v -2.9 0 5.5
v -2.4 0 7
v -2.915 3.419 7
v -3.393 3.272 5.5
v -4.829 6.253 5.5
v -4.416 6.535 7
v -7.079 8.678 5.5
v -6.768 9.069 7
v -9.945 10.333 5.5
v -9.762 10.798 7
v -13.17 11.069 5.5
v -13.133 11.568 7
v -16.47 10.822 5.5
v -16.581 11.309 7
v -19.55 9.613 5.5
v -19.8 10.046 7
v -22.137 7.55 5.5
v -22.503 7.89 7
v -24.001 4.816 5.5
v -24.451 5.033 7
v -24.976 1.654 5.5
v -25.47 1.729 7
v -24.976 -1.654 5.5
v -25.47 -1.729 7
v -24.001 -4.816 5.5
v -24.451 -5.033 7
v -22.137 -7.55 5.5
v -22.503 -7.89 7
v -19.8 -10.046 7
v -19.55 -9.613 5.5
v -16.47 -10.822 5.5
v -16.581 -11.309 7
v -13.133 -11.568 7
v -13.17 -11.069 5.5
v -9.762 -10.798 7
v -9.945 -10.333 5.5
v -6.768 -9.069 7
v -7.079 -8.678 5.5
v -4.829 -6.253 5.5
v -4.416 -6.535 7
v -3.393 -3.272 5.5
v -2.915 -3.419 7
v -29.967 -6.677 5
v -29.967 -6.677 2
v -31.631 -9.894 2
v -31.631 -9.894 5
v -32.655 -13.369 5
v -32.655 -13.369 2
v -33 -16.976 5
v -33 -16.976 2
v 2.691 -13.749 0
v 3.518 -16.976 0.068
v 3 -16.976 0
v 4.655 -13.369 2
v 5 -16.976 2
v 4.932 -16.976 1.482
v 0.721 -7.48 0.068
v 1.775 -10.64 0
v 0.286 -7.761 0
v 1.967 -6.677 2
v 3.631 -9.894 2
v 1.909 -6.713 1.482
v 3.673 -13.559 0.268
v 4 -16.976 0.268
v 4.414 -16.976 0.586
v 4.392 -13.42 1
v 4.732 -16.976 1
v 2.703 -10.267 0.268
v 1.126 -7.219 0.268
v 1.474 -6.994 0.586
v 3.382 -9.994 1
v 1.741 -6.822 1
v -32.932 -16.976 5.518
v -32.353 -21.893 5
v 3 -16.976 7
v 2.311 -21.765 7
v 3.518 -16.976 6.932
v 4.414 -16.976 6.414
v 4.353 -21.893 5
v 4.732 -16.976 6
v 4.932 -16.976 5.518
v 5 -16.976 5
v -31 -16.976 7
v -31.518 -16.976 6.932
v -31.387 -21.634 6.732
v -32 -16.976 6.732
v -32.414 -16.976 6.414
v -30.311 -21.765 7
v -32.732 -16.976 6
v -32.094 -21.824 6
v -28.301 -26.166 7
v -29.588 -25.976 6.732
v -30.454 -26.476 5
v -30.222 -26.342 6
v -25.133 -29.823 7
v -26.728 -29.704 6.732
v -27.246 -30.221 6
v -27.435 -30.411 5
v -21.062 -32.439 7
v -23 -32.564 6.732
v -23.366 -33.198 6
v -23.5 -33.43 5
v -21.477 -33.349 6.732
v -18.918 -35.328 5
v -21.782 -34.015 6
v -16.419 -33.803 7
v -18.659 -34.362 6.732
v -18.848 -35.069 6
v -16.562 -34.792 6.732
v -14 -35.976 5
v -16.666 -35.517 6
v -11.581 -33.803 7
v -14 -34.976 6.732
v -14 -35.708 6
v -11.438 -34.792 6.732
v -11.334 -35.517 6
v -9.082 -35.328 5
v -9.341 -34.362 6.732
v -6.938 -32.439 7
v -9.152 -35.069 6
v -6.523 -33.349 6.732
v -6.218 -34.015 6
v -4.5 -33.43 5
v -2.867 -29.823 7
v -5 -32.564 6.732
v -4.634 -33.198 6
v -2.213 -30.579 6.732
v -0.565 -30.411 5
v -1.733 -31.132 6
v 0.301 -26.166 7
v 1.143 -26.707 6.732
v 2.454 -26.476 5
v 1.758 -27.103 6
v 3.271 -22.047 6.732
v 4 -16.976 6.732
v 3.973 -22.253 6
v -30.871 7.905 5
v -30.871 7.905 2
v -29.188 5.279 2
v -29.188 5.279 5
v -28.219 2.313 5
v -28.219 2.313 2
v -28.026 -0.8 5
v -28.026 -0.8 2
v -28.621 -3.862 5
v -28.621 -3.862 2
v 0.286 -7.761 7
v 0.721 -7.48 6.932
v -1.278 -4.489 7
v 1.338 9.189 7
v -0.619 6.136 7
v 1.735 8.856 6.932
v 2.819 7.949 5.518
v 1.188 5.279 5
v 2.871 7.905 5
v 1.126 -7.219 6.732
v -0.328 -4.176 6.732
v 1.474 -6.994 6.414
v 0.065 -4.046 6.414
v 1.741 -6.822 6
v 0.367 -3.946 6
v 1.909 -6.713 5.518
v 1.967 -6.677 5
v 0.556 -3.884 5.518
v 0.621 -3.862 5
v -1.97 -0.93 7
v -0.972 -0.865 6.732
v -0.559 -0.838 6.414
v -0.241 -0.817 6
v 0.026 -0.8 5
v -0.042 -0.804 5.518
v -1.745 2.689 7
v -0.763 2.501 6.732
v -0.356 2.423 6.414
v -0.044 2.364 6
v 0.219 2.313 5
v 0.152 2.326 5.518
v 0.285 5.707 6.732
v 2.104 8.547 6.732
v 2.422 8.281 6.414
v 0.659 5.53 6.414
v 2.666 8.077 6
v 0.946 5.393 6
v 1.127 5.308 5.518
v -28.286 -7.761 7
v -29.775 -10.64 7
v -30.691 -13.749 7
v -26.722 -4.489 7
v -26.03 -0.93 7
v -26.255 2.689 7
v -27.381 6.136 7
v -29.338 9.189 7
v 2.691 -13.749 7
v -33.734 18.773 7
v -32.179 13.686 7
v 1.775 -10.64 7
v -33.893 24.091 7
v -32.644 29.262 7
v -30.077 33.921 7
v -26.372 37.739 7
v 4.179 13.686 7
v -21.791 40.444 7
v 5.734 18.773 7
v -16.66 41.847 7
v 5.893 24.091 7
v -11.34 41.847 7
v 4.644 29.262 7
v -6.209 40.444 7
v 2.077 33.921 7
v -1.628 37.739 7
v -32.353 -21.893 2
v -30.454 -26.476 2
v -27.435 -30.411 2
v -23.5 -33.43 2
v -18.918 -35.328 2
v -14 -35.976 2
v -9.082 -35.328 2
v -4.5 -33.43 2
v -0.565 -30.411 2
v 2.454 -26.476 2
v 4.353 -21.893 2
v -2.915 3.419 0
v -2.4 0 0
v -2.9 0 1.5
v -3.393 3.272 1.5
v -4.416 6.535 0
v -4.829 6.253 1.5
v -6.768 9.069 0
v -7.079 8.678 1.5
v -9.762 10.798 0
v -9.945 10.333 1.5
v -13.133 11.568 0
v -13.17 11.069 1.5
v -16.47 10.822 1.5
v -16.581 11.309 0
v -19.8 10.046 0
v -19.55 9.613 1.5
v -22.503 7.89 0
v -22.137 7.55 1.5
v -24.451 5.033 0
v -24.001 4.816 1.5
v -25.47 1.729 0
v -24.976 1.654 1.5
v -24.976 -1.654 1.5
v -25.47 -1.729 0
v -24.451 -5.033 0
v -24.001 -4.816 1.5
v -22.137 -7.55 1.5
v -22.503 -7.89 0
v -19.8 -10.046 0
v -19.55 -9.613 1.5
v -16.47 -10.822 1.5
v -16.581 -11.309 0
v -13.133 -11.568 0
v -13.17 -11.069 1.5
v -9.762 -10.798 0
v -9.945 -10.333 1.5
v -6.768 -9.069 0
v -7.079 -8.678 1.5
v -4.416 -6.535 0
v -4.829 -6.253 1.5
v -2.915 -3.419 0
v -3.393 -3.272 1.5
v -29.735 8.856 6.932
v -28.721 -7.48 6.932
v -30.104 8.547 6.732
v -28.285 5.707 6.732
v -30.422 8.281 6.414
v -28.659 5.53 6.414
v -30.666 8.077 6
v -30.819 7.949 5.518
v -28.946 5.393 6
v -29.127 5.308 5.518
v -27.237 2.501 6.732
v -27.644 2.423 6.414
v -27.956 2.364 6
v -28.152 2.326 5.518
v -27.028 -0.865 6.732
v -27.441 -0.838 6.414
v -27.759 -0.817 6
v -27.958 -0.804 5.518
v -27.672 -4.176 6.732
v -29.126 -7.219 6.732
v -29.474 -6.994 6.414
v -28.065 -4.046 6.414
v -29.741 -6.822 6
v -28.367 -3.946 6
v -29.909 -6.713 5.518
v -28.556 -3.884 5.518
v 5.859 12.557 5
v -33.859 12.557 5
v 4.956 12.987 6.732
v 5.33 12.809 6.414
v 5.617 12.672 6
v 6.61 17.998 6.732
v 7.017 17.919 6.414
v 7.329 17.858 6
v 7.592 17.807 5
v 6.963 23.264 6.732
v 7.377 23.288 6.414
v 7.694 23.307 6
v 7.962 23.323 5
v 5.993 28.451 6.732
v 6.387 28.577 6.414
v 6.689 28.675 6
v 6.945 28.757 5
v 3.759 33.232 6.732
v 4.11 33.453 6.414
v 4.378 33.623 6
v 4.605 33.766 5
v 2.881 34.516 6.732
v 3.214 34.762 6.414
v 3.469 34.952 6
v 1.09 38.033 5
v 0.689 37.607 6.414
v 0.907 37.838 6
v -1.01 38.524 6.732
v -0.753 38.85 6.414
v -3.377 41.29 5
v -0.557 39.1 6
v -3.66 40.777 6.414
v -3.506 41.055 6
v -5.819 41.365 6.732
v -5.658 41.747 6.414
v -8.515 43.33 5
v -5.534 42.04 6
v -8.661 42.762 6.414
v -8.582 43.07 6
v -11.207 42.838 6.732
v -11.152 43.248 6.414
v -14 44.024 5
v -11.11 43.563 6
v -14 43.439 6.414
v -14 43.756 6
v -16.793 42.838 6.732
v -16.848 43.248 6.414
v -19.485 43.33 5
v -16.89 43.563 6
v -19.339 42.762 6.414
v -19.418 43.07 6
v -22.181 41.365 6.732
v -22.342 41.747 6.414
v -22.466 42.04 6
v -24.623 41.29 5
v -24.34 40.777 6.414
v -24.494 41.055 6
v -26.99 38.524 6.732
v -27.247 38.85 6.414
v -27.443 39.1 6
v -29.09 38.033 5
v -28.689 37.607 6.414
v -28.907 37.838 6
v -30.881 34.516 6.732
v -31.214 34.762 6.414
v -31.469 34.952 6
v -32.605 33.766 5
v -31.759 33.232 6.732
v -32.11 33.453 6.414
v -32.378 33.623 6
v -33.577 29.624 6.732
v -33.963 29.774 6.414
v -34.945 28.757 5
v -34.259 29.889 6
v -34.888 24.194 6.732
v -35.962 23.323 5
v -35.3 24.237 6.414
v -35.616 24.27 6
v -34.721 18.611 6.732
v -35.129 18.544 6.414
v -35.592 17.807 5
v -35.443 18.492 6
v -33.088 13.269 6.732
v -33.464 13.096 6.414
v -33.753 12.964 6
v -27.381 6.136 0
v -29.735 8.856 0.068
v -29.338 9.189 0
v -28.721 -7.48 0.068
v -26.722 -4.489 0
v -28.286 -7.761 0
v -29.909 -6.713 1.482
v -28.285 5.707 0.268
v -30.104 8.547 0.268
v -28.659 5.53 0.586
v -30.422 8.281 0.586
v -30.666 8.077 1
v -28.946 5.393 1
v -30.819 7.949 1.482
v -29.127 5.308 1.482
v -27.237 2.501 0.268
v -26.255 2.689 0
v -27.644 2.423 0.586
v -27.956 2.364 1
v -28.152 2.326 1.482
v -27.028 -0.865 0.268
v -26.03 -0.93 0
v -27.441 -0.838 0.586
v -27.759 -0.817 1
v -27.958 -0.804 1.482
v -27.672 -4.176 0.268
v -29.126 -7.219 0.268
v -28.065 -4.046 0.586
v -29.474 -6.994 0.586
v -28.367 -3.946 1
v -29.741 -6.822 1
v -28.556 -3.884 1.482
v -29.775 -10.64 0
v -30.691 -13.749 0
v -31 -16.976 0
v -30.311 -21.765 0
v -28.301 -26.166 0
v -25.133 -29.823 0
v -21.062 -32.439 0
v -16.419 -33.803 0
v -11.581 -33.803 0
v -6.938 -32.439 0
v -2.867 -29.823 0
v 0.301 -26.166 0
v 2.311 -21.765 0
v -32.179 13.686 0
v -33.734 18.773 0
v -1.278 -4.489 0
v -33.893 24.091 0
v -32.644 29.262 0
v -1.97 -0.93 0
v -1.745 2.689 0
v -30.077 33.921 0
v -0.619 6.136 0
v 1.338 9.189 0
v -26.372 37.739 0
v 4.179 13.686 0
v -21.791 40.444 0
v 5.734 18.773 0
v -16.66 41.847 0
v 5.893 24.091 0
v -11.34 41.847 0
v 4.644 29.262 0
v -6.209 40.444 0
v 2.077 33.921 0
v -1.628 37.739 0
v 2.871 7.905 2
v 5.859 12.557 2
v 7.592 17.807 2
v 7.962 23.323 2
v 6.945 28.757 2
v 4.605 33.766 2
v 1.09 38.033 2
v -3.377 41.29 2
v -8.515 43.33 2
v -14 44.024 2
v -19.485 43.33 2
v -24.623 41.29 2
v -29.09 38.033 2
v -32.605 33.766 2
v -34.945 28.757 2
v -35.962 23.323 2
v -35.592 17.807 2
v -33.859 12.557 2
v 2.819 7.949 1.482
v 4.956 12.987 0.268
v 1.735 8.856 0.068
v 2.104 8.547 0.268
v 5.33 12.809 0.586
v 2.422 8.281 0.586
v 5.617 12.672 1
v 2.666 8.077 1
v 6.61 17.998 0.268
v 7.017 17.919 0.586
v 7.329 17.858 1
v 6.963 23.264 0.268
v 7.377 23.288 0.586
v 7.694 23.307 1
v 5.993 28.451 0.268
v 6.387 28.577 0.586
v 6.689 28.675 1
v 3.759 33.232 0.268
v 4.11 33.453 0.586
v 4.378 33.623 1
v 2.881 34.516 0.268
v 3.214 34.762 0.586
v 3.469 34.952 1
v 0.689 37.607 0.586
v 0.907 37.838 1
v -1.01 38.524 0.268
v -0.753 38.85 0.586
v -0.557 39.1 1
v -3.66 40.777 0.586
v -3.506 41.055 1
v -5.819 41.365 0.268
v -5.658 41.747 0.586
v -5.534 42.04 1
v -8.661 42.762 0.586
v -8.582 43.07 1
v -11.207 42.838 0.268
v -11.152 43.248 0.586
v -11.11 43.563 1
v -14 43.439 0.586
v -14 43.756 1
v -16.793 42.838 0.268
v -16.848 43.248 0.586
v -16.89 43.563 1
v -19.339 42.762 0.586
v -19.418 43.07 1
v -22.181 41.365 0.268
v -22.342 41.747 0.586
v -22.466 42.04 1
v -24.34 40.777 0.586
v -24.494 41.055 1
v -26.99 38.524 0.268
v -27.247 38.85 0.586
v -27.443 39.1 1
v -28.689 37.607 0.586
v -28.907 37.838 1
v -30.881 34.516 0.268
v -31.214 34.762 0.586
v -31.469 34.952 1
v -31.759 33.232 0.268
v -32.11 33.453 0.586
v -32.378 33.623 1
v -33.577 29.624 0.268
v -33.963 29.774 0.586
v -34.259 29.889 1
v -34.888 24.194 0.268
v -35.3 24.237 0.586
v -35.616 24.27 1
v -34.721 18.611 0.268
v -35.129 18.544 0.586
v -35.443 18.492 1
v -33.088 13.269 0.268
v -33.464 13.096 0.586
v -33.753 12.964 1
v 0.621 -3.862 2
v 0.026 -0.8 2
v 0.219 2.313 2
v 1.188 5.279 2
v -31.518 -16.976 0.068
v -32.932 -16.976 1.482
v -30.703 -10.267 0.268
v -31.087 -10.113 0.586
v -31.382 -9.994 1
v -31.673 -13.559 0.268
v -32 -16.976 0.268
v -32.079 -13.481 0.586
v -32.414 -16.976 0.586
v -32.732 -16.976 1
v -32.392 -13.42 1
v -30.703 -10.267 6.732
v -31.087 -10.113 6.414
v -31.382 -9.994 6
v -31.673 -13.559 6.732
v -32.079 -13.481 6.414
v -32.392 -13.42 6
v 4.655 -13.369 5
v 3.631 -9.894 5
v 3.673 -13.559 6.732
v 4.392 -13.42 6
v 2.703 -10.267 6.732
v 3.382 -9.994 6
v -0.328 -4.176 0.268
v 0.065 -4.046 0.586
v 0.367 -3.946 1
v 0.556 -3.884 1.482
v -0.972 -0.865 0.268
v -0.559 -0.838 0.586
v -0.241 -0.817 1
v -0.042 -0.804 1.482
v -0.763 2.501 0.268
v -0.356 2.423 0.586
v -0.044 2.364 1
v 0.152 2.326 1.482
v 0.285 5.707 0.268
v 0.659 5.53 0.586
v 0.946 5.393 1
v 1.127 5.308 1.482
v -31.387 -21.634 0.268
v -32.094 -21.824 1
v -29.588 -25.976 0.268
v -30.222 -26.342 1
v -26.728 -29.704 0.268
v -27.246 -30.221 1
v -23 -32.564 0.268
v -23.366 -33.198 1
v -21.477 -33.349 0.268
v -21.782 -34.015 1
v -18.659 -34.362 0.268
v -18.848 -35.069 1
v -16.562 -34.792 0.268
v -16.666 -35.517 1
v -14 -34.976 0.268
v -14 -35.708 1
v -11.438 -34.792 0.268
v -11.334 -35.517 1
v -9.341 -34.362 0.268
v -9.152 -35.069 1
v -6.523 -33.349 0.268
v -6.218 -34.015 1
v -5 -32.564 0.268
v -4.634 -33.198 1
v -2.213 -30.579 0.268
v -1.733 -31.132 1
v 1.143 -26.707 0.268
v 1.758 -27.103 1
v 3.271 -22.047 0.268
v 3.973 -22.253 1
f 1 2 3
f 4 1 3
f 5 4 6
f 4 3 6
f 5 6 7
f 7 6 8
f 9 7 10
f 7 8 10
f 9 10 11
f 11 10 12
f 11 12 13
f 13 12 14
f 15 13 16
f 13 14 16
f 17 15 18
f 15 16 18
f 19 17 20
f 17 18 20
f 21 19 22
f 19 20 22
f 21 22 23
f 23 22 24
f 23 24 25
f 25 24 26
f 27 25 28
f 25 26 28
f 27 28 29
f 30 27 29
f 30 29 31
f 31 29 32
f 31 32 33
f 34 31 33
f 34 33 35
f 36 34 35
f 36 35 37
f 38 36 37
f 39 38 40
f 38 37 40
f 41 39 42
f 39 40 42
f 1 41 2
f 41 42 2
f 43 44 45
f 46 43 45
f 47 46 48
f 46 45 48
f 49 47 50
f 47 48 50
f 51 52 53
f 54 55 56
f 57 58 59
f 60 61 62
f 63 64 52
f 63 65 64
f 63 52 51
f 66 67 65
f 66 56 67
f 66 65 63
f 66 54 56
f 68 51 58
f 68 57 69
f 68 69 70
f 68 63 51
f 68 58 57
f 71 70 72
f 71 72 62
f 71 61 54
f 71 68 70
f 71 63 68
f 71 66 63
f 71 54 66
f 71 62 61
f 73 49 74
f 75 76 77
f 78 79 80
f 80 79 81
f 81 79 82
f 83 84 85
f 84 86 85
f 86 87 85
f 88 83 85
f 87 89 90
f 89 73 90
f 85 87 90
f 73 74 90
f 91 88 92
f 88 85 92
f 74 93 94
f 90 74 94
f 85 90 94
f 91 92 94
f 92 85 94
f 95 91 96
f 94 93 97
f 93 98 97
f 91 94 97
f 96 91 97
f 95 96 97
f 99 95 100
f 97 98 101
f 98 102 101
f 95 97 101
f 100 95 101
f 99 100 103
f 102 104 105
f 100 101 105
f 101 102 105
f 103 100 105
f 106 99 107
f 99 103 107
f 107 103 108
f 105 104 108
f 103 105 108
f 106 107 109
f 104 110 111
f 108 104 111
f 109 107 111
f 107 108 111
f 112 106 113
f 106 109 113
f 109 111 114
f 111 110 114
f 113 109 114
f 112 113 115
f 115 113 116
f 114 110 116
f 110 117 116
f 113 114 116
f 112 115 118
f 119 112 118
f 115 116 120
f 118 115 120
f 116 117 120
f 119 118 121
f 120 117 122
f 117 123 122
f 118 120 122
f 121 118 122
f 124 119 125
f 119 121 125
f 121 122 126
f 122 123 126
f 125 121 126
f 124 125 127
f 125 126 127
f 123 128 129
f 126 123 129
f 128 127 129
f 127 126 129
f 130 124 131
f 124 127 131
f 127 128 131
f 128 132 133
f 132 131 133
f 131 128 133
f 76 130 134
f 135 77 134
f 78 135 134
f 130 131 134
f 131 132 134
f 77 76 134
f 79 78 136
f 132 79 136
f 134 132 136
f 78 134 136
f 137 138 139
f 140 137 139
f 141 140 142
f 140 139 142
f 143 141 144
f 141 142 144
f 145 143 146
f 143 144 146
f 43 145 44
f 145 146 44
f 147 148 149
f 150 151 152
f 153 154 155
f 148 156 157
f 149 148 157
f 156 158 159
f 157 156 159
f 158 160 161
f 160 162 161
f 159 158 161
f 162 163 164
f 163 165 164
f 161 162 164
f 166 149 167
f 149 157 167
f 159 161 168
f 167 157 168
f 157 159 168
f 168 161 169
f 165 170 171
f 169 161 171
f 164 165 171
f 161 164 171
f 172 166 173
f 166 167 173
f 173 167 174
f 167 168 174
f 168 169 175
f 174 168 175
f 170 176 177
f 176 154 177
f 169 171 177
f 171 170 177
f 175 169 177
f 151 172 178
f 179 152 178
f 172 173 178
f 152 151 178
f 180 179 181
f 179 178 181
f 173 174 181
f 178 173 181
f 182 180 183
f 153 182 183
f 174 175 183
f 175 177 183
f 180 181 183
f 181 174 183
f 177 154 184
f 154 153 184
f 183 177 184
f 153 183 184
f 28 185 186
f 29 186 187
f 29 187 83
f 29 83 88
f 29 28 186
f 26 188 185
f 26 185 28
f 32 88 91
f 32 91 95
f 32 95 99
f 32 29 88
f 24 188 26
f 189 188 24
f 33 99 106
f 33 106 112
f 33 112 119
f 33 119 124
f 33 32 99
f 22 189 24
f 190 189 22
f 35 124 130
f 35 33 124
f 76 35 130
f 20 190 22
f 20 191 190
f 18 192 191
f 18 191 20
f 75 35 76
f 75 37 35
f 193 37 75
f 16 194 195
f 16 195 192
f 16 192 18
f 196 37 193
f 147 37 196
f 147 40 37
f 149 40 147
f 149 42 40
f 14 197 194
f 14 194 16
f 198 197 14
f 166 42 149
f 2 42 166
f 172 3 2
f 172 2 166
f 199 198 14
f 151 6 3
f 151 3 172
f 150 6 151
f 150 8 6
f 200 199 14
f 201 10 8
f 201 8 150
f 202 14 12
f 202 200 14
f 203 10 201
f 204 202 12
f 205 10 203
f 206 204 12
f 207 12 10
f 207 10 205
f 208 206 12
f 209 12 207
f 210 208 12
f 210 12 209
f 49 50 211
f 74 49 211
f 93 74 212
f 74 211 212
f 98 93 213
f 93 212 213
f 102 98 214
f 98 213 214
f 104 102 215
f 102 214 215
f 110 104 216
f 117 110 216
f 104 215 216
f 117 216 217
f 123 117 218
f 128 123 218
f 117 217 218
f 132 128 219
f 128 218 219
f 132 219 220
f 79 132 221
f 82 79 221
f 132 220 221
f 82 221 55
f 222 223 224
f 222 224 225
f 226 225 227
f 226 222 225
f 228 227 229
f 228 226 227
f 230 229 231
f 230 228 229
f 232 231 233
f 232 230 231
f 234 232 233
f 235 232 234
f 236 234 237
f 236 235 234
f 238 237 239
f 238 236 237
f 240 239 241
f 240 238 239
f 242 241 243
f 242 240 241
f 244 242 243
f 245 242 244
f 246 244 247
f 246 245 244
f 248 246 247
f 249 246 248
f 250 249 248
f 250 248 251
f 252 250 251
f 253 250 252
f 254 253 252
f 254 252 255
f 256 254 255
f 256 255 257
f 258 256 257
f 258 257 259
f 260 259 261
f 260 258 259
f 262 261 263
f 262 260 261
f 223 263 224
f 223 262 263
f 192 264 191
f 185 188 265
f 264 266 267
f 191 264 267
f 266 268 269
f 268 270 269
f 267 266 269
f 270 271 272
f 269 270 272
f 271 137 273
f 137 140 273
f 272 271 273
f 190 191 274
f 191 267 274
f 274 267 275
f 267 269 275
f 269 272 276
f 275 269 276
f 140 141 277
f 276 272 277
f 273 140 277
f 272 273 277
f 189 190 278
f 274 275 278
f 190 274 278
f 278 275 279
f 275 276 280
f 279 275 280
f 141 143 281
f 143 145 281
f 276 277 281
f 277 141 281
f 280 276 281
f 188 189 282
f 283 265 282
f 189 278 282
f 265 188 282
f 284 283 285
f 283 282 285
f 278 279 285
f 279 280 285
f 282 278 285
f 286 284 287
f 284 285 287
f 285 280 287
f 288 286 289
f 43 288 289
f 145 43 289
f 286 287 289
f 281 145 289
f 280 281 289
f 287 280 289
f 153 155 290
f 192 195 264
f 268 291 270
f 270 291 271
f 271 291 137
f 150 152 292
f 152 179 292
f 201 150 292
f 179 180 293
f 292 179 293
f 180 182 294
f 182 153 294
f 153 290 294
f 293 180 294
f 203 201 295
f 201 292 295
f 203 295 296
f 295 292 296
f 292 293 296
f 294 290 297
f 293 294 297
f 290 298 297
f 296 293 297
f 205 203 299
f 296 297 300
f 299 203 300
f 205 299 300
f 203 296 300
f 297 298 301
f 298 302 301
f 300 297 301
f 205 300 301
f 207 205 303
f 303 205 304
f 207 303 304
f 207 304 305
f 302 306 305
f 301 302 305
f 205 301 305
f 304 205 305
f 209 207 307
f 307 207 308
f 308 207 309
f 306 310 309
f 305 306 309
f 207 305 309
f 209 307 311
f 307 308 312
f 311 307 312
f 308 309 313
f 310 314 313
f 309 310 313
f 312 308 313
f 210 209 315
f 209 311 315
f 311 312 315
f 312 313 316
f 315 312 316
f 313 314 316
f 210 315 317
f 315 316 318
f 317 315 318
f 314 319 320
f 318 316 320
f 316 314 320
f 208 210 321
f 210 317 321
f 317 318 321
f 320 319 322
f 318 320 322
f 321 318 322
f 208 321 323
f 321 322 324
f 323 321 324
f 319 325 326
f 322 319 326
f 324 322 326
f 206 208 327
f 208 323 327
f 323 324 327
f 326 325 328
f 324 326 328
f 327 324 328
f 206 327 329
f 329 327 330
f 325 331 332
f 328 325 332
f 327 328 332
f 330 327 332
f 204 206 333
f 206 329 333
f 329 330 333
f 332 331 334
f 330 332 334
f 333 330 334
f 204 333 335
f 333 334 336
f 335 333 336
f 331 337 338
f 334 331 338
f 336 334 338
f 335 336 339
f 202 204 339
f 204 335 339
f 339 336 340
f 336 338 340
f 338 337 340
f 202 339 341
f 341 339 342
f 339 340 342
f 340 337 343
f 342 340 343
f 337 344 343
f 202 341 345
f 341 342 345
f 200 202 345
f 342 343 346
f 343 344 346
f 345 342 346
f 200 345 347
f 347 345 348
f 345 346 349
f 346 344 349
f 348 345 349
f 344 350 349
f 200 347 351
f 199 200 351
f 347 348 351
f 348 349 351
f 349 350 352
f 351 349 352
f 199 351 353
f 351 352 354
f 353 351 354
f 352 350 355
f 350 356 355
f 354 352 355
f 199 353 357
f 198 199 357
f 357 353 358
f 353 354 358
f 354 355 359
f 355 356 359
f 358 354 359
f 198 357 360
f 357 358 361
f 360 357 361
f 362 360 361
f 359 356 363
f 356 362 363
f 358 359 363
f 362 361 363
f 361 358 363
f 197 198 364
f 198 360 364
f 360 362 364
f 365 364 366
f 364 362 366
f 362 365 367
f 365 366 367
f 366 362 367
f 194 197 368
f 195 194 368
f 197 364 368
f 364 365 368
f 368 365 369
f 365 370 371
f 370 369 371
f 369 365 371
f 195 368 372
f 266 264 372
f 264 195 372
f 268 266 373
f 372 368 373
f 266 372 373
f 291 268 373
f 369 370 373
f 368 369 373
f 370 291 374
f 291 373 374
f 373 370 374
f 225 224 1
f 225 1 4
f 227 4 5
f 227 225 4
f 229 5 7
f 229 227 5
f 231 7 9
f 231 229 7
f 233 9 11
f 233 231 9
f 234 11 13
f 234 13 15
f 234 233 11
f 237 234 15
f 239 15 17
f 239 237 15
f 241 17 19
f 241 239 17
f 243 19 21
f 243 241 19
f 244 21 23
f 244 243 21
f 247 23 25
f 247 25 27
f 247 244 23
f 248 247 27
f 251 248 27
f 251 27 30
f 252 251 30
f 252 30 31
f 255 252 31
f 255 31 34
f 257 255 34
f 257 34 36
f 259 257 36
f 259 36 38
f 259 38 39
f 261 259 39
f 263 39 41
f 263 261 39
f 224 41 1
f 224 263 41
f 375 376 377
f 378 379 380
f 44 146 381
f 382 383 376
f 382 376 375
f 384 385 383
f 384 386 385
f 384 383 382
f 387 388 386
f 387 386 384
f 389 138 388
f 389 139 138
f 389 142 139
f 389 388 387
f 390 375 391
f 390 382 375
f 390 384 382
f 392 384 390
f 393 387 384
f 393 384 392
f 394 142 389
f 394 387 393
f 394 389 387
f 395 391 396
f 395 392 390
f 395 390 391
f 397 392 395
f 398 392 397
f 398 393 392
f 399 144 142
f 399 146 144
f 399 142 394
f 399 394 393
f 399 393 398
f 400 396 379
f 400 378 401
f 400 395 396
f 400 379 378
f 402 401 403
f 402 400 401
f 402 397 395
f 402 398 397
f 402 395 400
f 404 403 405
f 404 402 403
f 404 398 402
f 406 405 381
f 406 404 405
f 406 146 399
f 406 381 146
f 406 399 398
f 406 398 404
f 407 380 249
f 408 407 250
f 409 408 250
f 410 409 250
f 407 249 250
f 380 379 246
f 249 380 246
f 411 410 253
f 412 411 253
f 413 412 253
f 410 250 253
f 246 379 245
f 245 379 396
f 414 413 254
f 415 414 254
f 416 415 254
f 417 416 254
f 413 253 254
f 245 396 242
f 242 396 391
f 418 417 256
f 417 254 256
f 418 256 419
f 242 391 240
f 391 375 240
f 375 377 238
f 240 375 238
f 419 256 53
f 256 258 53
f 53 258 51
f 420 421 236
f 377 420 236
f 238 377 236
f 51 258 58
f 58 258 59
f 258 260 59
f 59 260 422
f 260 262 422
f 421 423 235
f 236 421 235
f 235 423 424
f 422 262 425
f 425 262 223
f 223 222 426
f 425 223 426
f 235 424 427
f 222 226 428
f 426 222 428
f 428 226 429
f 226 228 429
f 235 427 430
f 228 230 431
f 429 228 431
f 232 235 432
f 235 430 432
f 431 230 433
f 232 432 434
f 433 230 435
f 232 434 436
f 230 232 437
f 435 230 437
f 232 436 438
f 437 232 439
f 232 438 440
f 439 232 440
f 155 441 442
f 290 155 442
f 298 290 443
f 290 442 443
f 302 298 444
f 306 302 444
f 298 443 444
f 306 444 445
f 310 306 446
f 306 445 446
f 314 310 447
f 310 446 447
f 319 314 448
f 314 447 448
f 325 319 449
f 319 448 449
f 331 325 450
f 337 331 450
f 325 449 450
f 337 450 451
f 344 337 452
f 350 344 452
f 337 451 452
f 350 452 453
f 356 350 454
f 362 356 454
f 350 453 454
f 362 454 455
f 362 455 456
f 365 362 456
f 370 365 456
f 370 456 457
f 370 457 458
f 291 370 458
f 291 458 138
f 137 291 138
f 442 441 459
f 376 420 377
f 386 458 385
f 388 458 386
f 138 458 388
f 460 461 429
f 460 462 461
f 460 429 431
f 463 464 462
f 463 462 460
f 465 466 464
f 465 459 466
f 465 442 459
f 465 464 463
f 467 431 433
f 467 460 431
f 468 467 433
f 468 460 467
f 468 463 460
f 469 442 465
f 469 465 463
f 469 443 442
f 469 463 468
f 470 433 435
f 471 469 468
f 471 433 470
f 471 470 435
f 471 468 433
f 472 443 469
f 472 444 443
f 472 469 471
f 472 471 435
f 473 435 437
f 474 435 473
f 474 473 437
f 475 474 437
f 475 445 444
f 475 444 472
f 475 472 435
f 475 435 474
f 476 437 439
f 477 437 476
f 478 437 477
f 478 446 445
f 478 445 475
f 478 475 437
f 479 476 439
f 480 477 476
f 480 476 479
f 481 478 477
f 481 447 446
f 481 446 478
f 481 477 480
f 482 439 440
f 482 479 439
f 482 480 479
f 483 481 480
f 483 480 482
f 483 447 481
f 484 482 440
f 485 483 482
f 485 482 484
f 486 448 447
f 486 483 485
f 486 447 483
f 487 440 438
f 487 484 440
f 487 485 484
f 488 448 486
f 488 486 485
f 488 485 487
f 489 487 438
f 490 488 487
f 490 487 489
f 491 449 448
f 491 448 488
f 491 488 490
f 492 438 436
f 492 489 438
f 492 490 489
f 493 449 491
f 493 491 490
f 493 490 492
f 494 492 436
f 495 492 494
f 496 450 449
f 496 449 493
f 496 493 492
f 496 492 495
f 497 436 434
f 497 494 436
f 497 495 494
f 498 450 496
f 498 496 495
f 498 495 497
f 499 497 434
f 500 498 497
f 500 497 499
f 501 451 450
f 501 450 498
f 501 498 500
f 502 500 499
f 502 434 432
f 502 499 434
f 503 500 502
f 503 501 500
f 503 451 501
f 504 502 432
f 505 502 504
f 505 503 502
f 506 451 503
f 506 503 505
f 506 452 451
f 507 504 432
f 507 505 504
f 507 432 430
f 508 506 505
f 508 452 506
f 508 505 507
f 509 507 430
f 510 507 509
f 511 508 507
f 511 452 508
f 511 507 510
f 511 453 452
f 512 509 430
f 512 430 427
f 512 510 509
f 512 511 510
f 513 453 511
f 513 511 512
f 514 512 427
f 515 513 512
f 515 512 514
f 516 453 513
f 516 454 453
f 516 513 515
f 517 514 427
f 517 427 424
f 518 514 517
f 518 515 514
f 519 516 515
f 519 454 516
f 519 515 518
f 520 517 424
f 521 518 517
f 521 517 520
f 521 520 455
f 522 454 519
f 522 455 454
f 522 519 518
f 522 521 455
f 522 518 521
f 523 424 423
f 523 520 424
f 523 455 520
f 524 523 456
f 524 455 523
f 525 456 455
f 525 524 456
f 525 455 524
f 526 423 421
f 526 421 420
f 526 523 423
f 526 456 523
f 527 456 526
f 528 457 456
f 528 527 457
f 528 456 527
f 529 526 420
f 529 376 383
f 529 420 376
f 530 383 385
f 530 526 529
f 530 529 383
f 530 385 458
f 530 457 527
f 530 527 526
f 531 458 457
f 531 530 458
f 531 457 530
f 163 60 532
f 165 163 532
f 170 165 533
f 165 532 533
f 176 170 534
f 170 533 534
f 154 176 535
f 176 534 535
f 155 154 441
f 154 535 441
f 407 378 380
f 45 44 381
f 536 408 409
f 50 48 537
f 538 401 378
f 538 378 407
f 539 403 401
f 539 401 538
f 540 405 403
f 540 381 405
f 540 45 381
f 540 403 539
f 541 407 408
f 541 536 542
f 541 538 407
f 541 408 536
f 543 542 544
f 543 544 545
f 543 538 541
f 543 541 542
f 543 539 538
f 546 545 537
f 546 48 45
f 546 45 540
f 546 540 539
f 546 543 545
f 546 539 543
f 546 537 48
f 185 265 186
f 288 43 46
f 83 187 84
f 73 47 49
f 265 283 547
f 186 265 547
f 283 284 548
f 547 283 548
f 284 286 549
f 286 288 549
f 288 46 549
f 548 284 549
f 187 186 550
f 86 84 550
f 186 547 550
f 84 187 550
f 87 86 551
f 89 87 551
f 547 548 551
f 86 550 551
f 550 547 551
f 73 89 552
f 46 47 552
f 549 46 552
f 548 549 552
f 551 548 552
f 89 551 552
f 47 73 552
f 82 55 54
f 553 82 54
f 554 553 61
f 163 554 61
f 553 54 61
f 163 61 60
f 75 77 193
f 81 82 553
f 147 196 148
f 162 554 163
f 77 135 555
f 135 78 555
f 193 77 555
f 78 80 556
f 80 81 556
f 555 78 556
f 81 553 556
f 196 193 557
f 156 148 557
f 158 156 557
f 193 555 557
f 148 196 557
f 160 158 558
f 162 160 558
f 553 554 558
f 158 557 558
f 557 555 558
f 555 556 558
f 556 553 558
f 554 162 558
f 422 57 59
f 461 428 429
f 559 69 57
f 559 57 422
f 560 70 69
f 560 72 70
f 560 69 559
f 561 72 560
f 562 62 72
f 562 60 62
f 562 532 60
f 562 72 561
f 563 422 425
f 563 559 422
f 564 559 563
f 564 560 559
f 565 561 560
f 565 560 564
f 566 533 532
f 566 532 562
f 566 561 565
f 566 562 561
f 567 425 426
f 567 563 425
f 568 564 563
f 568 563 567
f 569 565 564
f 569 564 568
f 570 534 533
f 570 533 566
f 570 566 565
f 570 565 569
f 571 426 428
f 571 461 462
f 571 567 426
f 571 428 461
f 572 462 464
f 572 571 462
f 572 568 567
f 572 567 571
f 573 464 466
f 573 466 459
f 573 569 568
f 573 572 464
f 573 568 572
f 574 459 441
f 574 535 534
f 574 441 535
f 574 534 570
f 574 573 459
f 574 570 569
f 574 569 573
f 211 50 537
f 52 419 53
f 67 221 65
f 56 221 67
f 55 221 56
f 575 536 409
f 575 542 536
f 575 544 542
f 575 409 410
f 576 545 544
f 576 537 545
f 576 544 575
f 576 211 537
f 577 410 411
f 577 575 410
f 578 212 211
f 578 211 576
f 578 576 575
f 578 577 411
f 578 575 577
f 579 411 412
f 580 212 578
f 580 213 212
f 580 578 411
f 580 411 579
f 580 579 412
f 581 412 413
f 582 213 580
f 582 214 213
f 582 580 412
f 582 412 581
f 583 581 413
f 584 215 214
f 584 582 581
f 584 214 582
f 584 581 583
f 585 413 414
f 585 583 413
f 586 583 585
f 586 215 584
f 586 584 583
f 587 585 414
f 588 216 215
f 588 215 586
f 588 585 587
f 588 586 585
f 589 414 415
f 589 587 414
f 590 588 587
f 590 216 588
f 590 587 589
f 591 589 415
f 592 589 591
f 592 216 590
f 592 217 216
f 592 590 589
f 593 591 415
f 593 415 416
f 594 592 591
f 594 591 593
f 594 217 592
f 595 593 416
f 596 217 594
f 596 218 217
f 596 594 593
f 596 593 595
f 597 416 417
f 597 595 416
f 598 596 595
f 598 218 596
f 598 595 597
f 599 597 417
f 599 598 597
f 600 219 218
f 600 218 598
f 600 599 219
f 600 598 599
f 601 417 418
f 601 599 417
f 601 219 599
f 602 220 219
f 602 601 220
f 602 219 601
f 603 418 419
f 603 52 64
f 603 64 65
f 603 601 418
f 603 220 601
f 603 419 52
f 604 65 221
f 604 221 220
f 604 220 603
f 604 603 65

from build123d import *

# Parameters (mm, degrees)
F0_R     = 11.1
F1_DEPTH = 7
F2_SIZE2 = 0.5
F2_SIZE  = 1.5
F3_R     = 2


with BuildPart() as f1:
    # F0 (on Top) → F1 (new body)
    with BuildSketch(Plane.XY):
        with BuildLine():
            ThreePointArc((-30.871365, 7.905008), (-28.023647, 0.762863), (-29.966515, -6.676558))
            ThreePointArc((-29.966515, -6.676558), (-32.225858, -11.607357), (-33, -16.975606))
            Line((-33, -16.975606), (5, -16.975606))
            ThreePointArc((5, -16.975606), (4.225858, -11.607357), (1.966515, -6.676558))
            ThreePointArc((1.966515, -6.676558), (0.023647, 0.762863), (2.871365, 7.905008))
            ThreePointArc((2.871365, 7.905008), (-14, 44.024394), (-30.871365, 7.905008))
        make_face()
        with Locations((-14, 0)):
            Circle(F0_R, mode=Mode.SUBTRACT)
        with BuildLine():
            Line((5, -16.975606), (-33, -16.975606))
            ThreePointArc((-33, -16.975606), (-14, -35.975606), (5, -16.975606))
        make_face()
    extrude(amount=F1_DEPTH)

    # F2
    f2_edges = [f1.edges().sort_by_distance(p)[0] for p in [
        (-25.1, 0, 7),
        (-25.1, 0, 0),
    ]]
    chamfer(f2_edges, length=F2_SIZE, length2=F2_SIZE2)

    # F3
    f3_edges = [f1.edges().sort_by_distance(p)[0] for p in [
        (-14, -35.975606, 7),
        (-14, -35.975606, 0),
    ]]
    fillet(f3_edges, radius=F3_R)


solid = f1.part
